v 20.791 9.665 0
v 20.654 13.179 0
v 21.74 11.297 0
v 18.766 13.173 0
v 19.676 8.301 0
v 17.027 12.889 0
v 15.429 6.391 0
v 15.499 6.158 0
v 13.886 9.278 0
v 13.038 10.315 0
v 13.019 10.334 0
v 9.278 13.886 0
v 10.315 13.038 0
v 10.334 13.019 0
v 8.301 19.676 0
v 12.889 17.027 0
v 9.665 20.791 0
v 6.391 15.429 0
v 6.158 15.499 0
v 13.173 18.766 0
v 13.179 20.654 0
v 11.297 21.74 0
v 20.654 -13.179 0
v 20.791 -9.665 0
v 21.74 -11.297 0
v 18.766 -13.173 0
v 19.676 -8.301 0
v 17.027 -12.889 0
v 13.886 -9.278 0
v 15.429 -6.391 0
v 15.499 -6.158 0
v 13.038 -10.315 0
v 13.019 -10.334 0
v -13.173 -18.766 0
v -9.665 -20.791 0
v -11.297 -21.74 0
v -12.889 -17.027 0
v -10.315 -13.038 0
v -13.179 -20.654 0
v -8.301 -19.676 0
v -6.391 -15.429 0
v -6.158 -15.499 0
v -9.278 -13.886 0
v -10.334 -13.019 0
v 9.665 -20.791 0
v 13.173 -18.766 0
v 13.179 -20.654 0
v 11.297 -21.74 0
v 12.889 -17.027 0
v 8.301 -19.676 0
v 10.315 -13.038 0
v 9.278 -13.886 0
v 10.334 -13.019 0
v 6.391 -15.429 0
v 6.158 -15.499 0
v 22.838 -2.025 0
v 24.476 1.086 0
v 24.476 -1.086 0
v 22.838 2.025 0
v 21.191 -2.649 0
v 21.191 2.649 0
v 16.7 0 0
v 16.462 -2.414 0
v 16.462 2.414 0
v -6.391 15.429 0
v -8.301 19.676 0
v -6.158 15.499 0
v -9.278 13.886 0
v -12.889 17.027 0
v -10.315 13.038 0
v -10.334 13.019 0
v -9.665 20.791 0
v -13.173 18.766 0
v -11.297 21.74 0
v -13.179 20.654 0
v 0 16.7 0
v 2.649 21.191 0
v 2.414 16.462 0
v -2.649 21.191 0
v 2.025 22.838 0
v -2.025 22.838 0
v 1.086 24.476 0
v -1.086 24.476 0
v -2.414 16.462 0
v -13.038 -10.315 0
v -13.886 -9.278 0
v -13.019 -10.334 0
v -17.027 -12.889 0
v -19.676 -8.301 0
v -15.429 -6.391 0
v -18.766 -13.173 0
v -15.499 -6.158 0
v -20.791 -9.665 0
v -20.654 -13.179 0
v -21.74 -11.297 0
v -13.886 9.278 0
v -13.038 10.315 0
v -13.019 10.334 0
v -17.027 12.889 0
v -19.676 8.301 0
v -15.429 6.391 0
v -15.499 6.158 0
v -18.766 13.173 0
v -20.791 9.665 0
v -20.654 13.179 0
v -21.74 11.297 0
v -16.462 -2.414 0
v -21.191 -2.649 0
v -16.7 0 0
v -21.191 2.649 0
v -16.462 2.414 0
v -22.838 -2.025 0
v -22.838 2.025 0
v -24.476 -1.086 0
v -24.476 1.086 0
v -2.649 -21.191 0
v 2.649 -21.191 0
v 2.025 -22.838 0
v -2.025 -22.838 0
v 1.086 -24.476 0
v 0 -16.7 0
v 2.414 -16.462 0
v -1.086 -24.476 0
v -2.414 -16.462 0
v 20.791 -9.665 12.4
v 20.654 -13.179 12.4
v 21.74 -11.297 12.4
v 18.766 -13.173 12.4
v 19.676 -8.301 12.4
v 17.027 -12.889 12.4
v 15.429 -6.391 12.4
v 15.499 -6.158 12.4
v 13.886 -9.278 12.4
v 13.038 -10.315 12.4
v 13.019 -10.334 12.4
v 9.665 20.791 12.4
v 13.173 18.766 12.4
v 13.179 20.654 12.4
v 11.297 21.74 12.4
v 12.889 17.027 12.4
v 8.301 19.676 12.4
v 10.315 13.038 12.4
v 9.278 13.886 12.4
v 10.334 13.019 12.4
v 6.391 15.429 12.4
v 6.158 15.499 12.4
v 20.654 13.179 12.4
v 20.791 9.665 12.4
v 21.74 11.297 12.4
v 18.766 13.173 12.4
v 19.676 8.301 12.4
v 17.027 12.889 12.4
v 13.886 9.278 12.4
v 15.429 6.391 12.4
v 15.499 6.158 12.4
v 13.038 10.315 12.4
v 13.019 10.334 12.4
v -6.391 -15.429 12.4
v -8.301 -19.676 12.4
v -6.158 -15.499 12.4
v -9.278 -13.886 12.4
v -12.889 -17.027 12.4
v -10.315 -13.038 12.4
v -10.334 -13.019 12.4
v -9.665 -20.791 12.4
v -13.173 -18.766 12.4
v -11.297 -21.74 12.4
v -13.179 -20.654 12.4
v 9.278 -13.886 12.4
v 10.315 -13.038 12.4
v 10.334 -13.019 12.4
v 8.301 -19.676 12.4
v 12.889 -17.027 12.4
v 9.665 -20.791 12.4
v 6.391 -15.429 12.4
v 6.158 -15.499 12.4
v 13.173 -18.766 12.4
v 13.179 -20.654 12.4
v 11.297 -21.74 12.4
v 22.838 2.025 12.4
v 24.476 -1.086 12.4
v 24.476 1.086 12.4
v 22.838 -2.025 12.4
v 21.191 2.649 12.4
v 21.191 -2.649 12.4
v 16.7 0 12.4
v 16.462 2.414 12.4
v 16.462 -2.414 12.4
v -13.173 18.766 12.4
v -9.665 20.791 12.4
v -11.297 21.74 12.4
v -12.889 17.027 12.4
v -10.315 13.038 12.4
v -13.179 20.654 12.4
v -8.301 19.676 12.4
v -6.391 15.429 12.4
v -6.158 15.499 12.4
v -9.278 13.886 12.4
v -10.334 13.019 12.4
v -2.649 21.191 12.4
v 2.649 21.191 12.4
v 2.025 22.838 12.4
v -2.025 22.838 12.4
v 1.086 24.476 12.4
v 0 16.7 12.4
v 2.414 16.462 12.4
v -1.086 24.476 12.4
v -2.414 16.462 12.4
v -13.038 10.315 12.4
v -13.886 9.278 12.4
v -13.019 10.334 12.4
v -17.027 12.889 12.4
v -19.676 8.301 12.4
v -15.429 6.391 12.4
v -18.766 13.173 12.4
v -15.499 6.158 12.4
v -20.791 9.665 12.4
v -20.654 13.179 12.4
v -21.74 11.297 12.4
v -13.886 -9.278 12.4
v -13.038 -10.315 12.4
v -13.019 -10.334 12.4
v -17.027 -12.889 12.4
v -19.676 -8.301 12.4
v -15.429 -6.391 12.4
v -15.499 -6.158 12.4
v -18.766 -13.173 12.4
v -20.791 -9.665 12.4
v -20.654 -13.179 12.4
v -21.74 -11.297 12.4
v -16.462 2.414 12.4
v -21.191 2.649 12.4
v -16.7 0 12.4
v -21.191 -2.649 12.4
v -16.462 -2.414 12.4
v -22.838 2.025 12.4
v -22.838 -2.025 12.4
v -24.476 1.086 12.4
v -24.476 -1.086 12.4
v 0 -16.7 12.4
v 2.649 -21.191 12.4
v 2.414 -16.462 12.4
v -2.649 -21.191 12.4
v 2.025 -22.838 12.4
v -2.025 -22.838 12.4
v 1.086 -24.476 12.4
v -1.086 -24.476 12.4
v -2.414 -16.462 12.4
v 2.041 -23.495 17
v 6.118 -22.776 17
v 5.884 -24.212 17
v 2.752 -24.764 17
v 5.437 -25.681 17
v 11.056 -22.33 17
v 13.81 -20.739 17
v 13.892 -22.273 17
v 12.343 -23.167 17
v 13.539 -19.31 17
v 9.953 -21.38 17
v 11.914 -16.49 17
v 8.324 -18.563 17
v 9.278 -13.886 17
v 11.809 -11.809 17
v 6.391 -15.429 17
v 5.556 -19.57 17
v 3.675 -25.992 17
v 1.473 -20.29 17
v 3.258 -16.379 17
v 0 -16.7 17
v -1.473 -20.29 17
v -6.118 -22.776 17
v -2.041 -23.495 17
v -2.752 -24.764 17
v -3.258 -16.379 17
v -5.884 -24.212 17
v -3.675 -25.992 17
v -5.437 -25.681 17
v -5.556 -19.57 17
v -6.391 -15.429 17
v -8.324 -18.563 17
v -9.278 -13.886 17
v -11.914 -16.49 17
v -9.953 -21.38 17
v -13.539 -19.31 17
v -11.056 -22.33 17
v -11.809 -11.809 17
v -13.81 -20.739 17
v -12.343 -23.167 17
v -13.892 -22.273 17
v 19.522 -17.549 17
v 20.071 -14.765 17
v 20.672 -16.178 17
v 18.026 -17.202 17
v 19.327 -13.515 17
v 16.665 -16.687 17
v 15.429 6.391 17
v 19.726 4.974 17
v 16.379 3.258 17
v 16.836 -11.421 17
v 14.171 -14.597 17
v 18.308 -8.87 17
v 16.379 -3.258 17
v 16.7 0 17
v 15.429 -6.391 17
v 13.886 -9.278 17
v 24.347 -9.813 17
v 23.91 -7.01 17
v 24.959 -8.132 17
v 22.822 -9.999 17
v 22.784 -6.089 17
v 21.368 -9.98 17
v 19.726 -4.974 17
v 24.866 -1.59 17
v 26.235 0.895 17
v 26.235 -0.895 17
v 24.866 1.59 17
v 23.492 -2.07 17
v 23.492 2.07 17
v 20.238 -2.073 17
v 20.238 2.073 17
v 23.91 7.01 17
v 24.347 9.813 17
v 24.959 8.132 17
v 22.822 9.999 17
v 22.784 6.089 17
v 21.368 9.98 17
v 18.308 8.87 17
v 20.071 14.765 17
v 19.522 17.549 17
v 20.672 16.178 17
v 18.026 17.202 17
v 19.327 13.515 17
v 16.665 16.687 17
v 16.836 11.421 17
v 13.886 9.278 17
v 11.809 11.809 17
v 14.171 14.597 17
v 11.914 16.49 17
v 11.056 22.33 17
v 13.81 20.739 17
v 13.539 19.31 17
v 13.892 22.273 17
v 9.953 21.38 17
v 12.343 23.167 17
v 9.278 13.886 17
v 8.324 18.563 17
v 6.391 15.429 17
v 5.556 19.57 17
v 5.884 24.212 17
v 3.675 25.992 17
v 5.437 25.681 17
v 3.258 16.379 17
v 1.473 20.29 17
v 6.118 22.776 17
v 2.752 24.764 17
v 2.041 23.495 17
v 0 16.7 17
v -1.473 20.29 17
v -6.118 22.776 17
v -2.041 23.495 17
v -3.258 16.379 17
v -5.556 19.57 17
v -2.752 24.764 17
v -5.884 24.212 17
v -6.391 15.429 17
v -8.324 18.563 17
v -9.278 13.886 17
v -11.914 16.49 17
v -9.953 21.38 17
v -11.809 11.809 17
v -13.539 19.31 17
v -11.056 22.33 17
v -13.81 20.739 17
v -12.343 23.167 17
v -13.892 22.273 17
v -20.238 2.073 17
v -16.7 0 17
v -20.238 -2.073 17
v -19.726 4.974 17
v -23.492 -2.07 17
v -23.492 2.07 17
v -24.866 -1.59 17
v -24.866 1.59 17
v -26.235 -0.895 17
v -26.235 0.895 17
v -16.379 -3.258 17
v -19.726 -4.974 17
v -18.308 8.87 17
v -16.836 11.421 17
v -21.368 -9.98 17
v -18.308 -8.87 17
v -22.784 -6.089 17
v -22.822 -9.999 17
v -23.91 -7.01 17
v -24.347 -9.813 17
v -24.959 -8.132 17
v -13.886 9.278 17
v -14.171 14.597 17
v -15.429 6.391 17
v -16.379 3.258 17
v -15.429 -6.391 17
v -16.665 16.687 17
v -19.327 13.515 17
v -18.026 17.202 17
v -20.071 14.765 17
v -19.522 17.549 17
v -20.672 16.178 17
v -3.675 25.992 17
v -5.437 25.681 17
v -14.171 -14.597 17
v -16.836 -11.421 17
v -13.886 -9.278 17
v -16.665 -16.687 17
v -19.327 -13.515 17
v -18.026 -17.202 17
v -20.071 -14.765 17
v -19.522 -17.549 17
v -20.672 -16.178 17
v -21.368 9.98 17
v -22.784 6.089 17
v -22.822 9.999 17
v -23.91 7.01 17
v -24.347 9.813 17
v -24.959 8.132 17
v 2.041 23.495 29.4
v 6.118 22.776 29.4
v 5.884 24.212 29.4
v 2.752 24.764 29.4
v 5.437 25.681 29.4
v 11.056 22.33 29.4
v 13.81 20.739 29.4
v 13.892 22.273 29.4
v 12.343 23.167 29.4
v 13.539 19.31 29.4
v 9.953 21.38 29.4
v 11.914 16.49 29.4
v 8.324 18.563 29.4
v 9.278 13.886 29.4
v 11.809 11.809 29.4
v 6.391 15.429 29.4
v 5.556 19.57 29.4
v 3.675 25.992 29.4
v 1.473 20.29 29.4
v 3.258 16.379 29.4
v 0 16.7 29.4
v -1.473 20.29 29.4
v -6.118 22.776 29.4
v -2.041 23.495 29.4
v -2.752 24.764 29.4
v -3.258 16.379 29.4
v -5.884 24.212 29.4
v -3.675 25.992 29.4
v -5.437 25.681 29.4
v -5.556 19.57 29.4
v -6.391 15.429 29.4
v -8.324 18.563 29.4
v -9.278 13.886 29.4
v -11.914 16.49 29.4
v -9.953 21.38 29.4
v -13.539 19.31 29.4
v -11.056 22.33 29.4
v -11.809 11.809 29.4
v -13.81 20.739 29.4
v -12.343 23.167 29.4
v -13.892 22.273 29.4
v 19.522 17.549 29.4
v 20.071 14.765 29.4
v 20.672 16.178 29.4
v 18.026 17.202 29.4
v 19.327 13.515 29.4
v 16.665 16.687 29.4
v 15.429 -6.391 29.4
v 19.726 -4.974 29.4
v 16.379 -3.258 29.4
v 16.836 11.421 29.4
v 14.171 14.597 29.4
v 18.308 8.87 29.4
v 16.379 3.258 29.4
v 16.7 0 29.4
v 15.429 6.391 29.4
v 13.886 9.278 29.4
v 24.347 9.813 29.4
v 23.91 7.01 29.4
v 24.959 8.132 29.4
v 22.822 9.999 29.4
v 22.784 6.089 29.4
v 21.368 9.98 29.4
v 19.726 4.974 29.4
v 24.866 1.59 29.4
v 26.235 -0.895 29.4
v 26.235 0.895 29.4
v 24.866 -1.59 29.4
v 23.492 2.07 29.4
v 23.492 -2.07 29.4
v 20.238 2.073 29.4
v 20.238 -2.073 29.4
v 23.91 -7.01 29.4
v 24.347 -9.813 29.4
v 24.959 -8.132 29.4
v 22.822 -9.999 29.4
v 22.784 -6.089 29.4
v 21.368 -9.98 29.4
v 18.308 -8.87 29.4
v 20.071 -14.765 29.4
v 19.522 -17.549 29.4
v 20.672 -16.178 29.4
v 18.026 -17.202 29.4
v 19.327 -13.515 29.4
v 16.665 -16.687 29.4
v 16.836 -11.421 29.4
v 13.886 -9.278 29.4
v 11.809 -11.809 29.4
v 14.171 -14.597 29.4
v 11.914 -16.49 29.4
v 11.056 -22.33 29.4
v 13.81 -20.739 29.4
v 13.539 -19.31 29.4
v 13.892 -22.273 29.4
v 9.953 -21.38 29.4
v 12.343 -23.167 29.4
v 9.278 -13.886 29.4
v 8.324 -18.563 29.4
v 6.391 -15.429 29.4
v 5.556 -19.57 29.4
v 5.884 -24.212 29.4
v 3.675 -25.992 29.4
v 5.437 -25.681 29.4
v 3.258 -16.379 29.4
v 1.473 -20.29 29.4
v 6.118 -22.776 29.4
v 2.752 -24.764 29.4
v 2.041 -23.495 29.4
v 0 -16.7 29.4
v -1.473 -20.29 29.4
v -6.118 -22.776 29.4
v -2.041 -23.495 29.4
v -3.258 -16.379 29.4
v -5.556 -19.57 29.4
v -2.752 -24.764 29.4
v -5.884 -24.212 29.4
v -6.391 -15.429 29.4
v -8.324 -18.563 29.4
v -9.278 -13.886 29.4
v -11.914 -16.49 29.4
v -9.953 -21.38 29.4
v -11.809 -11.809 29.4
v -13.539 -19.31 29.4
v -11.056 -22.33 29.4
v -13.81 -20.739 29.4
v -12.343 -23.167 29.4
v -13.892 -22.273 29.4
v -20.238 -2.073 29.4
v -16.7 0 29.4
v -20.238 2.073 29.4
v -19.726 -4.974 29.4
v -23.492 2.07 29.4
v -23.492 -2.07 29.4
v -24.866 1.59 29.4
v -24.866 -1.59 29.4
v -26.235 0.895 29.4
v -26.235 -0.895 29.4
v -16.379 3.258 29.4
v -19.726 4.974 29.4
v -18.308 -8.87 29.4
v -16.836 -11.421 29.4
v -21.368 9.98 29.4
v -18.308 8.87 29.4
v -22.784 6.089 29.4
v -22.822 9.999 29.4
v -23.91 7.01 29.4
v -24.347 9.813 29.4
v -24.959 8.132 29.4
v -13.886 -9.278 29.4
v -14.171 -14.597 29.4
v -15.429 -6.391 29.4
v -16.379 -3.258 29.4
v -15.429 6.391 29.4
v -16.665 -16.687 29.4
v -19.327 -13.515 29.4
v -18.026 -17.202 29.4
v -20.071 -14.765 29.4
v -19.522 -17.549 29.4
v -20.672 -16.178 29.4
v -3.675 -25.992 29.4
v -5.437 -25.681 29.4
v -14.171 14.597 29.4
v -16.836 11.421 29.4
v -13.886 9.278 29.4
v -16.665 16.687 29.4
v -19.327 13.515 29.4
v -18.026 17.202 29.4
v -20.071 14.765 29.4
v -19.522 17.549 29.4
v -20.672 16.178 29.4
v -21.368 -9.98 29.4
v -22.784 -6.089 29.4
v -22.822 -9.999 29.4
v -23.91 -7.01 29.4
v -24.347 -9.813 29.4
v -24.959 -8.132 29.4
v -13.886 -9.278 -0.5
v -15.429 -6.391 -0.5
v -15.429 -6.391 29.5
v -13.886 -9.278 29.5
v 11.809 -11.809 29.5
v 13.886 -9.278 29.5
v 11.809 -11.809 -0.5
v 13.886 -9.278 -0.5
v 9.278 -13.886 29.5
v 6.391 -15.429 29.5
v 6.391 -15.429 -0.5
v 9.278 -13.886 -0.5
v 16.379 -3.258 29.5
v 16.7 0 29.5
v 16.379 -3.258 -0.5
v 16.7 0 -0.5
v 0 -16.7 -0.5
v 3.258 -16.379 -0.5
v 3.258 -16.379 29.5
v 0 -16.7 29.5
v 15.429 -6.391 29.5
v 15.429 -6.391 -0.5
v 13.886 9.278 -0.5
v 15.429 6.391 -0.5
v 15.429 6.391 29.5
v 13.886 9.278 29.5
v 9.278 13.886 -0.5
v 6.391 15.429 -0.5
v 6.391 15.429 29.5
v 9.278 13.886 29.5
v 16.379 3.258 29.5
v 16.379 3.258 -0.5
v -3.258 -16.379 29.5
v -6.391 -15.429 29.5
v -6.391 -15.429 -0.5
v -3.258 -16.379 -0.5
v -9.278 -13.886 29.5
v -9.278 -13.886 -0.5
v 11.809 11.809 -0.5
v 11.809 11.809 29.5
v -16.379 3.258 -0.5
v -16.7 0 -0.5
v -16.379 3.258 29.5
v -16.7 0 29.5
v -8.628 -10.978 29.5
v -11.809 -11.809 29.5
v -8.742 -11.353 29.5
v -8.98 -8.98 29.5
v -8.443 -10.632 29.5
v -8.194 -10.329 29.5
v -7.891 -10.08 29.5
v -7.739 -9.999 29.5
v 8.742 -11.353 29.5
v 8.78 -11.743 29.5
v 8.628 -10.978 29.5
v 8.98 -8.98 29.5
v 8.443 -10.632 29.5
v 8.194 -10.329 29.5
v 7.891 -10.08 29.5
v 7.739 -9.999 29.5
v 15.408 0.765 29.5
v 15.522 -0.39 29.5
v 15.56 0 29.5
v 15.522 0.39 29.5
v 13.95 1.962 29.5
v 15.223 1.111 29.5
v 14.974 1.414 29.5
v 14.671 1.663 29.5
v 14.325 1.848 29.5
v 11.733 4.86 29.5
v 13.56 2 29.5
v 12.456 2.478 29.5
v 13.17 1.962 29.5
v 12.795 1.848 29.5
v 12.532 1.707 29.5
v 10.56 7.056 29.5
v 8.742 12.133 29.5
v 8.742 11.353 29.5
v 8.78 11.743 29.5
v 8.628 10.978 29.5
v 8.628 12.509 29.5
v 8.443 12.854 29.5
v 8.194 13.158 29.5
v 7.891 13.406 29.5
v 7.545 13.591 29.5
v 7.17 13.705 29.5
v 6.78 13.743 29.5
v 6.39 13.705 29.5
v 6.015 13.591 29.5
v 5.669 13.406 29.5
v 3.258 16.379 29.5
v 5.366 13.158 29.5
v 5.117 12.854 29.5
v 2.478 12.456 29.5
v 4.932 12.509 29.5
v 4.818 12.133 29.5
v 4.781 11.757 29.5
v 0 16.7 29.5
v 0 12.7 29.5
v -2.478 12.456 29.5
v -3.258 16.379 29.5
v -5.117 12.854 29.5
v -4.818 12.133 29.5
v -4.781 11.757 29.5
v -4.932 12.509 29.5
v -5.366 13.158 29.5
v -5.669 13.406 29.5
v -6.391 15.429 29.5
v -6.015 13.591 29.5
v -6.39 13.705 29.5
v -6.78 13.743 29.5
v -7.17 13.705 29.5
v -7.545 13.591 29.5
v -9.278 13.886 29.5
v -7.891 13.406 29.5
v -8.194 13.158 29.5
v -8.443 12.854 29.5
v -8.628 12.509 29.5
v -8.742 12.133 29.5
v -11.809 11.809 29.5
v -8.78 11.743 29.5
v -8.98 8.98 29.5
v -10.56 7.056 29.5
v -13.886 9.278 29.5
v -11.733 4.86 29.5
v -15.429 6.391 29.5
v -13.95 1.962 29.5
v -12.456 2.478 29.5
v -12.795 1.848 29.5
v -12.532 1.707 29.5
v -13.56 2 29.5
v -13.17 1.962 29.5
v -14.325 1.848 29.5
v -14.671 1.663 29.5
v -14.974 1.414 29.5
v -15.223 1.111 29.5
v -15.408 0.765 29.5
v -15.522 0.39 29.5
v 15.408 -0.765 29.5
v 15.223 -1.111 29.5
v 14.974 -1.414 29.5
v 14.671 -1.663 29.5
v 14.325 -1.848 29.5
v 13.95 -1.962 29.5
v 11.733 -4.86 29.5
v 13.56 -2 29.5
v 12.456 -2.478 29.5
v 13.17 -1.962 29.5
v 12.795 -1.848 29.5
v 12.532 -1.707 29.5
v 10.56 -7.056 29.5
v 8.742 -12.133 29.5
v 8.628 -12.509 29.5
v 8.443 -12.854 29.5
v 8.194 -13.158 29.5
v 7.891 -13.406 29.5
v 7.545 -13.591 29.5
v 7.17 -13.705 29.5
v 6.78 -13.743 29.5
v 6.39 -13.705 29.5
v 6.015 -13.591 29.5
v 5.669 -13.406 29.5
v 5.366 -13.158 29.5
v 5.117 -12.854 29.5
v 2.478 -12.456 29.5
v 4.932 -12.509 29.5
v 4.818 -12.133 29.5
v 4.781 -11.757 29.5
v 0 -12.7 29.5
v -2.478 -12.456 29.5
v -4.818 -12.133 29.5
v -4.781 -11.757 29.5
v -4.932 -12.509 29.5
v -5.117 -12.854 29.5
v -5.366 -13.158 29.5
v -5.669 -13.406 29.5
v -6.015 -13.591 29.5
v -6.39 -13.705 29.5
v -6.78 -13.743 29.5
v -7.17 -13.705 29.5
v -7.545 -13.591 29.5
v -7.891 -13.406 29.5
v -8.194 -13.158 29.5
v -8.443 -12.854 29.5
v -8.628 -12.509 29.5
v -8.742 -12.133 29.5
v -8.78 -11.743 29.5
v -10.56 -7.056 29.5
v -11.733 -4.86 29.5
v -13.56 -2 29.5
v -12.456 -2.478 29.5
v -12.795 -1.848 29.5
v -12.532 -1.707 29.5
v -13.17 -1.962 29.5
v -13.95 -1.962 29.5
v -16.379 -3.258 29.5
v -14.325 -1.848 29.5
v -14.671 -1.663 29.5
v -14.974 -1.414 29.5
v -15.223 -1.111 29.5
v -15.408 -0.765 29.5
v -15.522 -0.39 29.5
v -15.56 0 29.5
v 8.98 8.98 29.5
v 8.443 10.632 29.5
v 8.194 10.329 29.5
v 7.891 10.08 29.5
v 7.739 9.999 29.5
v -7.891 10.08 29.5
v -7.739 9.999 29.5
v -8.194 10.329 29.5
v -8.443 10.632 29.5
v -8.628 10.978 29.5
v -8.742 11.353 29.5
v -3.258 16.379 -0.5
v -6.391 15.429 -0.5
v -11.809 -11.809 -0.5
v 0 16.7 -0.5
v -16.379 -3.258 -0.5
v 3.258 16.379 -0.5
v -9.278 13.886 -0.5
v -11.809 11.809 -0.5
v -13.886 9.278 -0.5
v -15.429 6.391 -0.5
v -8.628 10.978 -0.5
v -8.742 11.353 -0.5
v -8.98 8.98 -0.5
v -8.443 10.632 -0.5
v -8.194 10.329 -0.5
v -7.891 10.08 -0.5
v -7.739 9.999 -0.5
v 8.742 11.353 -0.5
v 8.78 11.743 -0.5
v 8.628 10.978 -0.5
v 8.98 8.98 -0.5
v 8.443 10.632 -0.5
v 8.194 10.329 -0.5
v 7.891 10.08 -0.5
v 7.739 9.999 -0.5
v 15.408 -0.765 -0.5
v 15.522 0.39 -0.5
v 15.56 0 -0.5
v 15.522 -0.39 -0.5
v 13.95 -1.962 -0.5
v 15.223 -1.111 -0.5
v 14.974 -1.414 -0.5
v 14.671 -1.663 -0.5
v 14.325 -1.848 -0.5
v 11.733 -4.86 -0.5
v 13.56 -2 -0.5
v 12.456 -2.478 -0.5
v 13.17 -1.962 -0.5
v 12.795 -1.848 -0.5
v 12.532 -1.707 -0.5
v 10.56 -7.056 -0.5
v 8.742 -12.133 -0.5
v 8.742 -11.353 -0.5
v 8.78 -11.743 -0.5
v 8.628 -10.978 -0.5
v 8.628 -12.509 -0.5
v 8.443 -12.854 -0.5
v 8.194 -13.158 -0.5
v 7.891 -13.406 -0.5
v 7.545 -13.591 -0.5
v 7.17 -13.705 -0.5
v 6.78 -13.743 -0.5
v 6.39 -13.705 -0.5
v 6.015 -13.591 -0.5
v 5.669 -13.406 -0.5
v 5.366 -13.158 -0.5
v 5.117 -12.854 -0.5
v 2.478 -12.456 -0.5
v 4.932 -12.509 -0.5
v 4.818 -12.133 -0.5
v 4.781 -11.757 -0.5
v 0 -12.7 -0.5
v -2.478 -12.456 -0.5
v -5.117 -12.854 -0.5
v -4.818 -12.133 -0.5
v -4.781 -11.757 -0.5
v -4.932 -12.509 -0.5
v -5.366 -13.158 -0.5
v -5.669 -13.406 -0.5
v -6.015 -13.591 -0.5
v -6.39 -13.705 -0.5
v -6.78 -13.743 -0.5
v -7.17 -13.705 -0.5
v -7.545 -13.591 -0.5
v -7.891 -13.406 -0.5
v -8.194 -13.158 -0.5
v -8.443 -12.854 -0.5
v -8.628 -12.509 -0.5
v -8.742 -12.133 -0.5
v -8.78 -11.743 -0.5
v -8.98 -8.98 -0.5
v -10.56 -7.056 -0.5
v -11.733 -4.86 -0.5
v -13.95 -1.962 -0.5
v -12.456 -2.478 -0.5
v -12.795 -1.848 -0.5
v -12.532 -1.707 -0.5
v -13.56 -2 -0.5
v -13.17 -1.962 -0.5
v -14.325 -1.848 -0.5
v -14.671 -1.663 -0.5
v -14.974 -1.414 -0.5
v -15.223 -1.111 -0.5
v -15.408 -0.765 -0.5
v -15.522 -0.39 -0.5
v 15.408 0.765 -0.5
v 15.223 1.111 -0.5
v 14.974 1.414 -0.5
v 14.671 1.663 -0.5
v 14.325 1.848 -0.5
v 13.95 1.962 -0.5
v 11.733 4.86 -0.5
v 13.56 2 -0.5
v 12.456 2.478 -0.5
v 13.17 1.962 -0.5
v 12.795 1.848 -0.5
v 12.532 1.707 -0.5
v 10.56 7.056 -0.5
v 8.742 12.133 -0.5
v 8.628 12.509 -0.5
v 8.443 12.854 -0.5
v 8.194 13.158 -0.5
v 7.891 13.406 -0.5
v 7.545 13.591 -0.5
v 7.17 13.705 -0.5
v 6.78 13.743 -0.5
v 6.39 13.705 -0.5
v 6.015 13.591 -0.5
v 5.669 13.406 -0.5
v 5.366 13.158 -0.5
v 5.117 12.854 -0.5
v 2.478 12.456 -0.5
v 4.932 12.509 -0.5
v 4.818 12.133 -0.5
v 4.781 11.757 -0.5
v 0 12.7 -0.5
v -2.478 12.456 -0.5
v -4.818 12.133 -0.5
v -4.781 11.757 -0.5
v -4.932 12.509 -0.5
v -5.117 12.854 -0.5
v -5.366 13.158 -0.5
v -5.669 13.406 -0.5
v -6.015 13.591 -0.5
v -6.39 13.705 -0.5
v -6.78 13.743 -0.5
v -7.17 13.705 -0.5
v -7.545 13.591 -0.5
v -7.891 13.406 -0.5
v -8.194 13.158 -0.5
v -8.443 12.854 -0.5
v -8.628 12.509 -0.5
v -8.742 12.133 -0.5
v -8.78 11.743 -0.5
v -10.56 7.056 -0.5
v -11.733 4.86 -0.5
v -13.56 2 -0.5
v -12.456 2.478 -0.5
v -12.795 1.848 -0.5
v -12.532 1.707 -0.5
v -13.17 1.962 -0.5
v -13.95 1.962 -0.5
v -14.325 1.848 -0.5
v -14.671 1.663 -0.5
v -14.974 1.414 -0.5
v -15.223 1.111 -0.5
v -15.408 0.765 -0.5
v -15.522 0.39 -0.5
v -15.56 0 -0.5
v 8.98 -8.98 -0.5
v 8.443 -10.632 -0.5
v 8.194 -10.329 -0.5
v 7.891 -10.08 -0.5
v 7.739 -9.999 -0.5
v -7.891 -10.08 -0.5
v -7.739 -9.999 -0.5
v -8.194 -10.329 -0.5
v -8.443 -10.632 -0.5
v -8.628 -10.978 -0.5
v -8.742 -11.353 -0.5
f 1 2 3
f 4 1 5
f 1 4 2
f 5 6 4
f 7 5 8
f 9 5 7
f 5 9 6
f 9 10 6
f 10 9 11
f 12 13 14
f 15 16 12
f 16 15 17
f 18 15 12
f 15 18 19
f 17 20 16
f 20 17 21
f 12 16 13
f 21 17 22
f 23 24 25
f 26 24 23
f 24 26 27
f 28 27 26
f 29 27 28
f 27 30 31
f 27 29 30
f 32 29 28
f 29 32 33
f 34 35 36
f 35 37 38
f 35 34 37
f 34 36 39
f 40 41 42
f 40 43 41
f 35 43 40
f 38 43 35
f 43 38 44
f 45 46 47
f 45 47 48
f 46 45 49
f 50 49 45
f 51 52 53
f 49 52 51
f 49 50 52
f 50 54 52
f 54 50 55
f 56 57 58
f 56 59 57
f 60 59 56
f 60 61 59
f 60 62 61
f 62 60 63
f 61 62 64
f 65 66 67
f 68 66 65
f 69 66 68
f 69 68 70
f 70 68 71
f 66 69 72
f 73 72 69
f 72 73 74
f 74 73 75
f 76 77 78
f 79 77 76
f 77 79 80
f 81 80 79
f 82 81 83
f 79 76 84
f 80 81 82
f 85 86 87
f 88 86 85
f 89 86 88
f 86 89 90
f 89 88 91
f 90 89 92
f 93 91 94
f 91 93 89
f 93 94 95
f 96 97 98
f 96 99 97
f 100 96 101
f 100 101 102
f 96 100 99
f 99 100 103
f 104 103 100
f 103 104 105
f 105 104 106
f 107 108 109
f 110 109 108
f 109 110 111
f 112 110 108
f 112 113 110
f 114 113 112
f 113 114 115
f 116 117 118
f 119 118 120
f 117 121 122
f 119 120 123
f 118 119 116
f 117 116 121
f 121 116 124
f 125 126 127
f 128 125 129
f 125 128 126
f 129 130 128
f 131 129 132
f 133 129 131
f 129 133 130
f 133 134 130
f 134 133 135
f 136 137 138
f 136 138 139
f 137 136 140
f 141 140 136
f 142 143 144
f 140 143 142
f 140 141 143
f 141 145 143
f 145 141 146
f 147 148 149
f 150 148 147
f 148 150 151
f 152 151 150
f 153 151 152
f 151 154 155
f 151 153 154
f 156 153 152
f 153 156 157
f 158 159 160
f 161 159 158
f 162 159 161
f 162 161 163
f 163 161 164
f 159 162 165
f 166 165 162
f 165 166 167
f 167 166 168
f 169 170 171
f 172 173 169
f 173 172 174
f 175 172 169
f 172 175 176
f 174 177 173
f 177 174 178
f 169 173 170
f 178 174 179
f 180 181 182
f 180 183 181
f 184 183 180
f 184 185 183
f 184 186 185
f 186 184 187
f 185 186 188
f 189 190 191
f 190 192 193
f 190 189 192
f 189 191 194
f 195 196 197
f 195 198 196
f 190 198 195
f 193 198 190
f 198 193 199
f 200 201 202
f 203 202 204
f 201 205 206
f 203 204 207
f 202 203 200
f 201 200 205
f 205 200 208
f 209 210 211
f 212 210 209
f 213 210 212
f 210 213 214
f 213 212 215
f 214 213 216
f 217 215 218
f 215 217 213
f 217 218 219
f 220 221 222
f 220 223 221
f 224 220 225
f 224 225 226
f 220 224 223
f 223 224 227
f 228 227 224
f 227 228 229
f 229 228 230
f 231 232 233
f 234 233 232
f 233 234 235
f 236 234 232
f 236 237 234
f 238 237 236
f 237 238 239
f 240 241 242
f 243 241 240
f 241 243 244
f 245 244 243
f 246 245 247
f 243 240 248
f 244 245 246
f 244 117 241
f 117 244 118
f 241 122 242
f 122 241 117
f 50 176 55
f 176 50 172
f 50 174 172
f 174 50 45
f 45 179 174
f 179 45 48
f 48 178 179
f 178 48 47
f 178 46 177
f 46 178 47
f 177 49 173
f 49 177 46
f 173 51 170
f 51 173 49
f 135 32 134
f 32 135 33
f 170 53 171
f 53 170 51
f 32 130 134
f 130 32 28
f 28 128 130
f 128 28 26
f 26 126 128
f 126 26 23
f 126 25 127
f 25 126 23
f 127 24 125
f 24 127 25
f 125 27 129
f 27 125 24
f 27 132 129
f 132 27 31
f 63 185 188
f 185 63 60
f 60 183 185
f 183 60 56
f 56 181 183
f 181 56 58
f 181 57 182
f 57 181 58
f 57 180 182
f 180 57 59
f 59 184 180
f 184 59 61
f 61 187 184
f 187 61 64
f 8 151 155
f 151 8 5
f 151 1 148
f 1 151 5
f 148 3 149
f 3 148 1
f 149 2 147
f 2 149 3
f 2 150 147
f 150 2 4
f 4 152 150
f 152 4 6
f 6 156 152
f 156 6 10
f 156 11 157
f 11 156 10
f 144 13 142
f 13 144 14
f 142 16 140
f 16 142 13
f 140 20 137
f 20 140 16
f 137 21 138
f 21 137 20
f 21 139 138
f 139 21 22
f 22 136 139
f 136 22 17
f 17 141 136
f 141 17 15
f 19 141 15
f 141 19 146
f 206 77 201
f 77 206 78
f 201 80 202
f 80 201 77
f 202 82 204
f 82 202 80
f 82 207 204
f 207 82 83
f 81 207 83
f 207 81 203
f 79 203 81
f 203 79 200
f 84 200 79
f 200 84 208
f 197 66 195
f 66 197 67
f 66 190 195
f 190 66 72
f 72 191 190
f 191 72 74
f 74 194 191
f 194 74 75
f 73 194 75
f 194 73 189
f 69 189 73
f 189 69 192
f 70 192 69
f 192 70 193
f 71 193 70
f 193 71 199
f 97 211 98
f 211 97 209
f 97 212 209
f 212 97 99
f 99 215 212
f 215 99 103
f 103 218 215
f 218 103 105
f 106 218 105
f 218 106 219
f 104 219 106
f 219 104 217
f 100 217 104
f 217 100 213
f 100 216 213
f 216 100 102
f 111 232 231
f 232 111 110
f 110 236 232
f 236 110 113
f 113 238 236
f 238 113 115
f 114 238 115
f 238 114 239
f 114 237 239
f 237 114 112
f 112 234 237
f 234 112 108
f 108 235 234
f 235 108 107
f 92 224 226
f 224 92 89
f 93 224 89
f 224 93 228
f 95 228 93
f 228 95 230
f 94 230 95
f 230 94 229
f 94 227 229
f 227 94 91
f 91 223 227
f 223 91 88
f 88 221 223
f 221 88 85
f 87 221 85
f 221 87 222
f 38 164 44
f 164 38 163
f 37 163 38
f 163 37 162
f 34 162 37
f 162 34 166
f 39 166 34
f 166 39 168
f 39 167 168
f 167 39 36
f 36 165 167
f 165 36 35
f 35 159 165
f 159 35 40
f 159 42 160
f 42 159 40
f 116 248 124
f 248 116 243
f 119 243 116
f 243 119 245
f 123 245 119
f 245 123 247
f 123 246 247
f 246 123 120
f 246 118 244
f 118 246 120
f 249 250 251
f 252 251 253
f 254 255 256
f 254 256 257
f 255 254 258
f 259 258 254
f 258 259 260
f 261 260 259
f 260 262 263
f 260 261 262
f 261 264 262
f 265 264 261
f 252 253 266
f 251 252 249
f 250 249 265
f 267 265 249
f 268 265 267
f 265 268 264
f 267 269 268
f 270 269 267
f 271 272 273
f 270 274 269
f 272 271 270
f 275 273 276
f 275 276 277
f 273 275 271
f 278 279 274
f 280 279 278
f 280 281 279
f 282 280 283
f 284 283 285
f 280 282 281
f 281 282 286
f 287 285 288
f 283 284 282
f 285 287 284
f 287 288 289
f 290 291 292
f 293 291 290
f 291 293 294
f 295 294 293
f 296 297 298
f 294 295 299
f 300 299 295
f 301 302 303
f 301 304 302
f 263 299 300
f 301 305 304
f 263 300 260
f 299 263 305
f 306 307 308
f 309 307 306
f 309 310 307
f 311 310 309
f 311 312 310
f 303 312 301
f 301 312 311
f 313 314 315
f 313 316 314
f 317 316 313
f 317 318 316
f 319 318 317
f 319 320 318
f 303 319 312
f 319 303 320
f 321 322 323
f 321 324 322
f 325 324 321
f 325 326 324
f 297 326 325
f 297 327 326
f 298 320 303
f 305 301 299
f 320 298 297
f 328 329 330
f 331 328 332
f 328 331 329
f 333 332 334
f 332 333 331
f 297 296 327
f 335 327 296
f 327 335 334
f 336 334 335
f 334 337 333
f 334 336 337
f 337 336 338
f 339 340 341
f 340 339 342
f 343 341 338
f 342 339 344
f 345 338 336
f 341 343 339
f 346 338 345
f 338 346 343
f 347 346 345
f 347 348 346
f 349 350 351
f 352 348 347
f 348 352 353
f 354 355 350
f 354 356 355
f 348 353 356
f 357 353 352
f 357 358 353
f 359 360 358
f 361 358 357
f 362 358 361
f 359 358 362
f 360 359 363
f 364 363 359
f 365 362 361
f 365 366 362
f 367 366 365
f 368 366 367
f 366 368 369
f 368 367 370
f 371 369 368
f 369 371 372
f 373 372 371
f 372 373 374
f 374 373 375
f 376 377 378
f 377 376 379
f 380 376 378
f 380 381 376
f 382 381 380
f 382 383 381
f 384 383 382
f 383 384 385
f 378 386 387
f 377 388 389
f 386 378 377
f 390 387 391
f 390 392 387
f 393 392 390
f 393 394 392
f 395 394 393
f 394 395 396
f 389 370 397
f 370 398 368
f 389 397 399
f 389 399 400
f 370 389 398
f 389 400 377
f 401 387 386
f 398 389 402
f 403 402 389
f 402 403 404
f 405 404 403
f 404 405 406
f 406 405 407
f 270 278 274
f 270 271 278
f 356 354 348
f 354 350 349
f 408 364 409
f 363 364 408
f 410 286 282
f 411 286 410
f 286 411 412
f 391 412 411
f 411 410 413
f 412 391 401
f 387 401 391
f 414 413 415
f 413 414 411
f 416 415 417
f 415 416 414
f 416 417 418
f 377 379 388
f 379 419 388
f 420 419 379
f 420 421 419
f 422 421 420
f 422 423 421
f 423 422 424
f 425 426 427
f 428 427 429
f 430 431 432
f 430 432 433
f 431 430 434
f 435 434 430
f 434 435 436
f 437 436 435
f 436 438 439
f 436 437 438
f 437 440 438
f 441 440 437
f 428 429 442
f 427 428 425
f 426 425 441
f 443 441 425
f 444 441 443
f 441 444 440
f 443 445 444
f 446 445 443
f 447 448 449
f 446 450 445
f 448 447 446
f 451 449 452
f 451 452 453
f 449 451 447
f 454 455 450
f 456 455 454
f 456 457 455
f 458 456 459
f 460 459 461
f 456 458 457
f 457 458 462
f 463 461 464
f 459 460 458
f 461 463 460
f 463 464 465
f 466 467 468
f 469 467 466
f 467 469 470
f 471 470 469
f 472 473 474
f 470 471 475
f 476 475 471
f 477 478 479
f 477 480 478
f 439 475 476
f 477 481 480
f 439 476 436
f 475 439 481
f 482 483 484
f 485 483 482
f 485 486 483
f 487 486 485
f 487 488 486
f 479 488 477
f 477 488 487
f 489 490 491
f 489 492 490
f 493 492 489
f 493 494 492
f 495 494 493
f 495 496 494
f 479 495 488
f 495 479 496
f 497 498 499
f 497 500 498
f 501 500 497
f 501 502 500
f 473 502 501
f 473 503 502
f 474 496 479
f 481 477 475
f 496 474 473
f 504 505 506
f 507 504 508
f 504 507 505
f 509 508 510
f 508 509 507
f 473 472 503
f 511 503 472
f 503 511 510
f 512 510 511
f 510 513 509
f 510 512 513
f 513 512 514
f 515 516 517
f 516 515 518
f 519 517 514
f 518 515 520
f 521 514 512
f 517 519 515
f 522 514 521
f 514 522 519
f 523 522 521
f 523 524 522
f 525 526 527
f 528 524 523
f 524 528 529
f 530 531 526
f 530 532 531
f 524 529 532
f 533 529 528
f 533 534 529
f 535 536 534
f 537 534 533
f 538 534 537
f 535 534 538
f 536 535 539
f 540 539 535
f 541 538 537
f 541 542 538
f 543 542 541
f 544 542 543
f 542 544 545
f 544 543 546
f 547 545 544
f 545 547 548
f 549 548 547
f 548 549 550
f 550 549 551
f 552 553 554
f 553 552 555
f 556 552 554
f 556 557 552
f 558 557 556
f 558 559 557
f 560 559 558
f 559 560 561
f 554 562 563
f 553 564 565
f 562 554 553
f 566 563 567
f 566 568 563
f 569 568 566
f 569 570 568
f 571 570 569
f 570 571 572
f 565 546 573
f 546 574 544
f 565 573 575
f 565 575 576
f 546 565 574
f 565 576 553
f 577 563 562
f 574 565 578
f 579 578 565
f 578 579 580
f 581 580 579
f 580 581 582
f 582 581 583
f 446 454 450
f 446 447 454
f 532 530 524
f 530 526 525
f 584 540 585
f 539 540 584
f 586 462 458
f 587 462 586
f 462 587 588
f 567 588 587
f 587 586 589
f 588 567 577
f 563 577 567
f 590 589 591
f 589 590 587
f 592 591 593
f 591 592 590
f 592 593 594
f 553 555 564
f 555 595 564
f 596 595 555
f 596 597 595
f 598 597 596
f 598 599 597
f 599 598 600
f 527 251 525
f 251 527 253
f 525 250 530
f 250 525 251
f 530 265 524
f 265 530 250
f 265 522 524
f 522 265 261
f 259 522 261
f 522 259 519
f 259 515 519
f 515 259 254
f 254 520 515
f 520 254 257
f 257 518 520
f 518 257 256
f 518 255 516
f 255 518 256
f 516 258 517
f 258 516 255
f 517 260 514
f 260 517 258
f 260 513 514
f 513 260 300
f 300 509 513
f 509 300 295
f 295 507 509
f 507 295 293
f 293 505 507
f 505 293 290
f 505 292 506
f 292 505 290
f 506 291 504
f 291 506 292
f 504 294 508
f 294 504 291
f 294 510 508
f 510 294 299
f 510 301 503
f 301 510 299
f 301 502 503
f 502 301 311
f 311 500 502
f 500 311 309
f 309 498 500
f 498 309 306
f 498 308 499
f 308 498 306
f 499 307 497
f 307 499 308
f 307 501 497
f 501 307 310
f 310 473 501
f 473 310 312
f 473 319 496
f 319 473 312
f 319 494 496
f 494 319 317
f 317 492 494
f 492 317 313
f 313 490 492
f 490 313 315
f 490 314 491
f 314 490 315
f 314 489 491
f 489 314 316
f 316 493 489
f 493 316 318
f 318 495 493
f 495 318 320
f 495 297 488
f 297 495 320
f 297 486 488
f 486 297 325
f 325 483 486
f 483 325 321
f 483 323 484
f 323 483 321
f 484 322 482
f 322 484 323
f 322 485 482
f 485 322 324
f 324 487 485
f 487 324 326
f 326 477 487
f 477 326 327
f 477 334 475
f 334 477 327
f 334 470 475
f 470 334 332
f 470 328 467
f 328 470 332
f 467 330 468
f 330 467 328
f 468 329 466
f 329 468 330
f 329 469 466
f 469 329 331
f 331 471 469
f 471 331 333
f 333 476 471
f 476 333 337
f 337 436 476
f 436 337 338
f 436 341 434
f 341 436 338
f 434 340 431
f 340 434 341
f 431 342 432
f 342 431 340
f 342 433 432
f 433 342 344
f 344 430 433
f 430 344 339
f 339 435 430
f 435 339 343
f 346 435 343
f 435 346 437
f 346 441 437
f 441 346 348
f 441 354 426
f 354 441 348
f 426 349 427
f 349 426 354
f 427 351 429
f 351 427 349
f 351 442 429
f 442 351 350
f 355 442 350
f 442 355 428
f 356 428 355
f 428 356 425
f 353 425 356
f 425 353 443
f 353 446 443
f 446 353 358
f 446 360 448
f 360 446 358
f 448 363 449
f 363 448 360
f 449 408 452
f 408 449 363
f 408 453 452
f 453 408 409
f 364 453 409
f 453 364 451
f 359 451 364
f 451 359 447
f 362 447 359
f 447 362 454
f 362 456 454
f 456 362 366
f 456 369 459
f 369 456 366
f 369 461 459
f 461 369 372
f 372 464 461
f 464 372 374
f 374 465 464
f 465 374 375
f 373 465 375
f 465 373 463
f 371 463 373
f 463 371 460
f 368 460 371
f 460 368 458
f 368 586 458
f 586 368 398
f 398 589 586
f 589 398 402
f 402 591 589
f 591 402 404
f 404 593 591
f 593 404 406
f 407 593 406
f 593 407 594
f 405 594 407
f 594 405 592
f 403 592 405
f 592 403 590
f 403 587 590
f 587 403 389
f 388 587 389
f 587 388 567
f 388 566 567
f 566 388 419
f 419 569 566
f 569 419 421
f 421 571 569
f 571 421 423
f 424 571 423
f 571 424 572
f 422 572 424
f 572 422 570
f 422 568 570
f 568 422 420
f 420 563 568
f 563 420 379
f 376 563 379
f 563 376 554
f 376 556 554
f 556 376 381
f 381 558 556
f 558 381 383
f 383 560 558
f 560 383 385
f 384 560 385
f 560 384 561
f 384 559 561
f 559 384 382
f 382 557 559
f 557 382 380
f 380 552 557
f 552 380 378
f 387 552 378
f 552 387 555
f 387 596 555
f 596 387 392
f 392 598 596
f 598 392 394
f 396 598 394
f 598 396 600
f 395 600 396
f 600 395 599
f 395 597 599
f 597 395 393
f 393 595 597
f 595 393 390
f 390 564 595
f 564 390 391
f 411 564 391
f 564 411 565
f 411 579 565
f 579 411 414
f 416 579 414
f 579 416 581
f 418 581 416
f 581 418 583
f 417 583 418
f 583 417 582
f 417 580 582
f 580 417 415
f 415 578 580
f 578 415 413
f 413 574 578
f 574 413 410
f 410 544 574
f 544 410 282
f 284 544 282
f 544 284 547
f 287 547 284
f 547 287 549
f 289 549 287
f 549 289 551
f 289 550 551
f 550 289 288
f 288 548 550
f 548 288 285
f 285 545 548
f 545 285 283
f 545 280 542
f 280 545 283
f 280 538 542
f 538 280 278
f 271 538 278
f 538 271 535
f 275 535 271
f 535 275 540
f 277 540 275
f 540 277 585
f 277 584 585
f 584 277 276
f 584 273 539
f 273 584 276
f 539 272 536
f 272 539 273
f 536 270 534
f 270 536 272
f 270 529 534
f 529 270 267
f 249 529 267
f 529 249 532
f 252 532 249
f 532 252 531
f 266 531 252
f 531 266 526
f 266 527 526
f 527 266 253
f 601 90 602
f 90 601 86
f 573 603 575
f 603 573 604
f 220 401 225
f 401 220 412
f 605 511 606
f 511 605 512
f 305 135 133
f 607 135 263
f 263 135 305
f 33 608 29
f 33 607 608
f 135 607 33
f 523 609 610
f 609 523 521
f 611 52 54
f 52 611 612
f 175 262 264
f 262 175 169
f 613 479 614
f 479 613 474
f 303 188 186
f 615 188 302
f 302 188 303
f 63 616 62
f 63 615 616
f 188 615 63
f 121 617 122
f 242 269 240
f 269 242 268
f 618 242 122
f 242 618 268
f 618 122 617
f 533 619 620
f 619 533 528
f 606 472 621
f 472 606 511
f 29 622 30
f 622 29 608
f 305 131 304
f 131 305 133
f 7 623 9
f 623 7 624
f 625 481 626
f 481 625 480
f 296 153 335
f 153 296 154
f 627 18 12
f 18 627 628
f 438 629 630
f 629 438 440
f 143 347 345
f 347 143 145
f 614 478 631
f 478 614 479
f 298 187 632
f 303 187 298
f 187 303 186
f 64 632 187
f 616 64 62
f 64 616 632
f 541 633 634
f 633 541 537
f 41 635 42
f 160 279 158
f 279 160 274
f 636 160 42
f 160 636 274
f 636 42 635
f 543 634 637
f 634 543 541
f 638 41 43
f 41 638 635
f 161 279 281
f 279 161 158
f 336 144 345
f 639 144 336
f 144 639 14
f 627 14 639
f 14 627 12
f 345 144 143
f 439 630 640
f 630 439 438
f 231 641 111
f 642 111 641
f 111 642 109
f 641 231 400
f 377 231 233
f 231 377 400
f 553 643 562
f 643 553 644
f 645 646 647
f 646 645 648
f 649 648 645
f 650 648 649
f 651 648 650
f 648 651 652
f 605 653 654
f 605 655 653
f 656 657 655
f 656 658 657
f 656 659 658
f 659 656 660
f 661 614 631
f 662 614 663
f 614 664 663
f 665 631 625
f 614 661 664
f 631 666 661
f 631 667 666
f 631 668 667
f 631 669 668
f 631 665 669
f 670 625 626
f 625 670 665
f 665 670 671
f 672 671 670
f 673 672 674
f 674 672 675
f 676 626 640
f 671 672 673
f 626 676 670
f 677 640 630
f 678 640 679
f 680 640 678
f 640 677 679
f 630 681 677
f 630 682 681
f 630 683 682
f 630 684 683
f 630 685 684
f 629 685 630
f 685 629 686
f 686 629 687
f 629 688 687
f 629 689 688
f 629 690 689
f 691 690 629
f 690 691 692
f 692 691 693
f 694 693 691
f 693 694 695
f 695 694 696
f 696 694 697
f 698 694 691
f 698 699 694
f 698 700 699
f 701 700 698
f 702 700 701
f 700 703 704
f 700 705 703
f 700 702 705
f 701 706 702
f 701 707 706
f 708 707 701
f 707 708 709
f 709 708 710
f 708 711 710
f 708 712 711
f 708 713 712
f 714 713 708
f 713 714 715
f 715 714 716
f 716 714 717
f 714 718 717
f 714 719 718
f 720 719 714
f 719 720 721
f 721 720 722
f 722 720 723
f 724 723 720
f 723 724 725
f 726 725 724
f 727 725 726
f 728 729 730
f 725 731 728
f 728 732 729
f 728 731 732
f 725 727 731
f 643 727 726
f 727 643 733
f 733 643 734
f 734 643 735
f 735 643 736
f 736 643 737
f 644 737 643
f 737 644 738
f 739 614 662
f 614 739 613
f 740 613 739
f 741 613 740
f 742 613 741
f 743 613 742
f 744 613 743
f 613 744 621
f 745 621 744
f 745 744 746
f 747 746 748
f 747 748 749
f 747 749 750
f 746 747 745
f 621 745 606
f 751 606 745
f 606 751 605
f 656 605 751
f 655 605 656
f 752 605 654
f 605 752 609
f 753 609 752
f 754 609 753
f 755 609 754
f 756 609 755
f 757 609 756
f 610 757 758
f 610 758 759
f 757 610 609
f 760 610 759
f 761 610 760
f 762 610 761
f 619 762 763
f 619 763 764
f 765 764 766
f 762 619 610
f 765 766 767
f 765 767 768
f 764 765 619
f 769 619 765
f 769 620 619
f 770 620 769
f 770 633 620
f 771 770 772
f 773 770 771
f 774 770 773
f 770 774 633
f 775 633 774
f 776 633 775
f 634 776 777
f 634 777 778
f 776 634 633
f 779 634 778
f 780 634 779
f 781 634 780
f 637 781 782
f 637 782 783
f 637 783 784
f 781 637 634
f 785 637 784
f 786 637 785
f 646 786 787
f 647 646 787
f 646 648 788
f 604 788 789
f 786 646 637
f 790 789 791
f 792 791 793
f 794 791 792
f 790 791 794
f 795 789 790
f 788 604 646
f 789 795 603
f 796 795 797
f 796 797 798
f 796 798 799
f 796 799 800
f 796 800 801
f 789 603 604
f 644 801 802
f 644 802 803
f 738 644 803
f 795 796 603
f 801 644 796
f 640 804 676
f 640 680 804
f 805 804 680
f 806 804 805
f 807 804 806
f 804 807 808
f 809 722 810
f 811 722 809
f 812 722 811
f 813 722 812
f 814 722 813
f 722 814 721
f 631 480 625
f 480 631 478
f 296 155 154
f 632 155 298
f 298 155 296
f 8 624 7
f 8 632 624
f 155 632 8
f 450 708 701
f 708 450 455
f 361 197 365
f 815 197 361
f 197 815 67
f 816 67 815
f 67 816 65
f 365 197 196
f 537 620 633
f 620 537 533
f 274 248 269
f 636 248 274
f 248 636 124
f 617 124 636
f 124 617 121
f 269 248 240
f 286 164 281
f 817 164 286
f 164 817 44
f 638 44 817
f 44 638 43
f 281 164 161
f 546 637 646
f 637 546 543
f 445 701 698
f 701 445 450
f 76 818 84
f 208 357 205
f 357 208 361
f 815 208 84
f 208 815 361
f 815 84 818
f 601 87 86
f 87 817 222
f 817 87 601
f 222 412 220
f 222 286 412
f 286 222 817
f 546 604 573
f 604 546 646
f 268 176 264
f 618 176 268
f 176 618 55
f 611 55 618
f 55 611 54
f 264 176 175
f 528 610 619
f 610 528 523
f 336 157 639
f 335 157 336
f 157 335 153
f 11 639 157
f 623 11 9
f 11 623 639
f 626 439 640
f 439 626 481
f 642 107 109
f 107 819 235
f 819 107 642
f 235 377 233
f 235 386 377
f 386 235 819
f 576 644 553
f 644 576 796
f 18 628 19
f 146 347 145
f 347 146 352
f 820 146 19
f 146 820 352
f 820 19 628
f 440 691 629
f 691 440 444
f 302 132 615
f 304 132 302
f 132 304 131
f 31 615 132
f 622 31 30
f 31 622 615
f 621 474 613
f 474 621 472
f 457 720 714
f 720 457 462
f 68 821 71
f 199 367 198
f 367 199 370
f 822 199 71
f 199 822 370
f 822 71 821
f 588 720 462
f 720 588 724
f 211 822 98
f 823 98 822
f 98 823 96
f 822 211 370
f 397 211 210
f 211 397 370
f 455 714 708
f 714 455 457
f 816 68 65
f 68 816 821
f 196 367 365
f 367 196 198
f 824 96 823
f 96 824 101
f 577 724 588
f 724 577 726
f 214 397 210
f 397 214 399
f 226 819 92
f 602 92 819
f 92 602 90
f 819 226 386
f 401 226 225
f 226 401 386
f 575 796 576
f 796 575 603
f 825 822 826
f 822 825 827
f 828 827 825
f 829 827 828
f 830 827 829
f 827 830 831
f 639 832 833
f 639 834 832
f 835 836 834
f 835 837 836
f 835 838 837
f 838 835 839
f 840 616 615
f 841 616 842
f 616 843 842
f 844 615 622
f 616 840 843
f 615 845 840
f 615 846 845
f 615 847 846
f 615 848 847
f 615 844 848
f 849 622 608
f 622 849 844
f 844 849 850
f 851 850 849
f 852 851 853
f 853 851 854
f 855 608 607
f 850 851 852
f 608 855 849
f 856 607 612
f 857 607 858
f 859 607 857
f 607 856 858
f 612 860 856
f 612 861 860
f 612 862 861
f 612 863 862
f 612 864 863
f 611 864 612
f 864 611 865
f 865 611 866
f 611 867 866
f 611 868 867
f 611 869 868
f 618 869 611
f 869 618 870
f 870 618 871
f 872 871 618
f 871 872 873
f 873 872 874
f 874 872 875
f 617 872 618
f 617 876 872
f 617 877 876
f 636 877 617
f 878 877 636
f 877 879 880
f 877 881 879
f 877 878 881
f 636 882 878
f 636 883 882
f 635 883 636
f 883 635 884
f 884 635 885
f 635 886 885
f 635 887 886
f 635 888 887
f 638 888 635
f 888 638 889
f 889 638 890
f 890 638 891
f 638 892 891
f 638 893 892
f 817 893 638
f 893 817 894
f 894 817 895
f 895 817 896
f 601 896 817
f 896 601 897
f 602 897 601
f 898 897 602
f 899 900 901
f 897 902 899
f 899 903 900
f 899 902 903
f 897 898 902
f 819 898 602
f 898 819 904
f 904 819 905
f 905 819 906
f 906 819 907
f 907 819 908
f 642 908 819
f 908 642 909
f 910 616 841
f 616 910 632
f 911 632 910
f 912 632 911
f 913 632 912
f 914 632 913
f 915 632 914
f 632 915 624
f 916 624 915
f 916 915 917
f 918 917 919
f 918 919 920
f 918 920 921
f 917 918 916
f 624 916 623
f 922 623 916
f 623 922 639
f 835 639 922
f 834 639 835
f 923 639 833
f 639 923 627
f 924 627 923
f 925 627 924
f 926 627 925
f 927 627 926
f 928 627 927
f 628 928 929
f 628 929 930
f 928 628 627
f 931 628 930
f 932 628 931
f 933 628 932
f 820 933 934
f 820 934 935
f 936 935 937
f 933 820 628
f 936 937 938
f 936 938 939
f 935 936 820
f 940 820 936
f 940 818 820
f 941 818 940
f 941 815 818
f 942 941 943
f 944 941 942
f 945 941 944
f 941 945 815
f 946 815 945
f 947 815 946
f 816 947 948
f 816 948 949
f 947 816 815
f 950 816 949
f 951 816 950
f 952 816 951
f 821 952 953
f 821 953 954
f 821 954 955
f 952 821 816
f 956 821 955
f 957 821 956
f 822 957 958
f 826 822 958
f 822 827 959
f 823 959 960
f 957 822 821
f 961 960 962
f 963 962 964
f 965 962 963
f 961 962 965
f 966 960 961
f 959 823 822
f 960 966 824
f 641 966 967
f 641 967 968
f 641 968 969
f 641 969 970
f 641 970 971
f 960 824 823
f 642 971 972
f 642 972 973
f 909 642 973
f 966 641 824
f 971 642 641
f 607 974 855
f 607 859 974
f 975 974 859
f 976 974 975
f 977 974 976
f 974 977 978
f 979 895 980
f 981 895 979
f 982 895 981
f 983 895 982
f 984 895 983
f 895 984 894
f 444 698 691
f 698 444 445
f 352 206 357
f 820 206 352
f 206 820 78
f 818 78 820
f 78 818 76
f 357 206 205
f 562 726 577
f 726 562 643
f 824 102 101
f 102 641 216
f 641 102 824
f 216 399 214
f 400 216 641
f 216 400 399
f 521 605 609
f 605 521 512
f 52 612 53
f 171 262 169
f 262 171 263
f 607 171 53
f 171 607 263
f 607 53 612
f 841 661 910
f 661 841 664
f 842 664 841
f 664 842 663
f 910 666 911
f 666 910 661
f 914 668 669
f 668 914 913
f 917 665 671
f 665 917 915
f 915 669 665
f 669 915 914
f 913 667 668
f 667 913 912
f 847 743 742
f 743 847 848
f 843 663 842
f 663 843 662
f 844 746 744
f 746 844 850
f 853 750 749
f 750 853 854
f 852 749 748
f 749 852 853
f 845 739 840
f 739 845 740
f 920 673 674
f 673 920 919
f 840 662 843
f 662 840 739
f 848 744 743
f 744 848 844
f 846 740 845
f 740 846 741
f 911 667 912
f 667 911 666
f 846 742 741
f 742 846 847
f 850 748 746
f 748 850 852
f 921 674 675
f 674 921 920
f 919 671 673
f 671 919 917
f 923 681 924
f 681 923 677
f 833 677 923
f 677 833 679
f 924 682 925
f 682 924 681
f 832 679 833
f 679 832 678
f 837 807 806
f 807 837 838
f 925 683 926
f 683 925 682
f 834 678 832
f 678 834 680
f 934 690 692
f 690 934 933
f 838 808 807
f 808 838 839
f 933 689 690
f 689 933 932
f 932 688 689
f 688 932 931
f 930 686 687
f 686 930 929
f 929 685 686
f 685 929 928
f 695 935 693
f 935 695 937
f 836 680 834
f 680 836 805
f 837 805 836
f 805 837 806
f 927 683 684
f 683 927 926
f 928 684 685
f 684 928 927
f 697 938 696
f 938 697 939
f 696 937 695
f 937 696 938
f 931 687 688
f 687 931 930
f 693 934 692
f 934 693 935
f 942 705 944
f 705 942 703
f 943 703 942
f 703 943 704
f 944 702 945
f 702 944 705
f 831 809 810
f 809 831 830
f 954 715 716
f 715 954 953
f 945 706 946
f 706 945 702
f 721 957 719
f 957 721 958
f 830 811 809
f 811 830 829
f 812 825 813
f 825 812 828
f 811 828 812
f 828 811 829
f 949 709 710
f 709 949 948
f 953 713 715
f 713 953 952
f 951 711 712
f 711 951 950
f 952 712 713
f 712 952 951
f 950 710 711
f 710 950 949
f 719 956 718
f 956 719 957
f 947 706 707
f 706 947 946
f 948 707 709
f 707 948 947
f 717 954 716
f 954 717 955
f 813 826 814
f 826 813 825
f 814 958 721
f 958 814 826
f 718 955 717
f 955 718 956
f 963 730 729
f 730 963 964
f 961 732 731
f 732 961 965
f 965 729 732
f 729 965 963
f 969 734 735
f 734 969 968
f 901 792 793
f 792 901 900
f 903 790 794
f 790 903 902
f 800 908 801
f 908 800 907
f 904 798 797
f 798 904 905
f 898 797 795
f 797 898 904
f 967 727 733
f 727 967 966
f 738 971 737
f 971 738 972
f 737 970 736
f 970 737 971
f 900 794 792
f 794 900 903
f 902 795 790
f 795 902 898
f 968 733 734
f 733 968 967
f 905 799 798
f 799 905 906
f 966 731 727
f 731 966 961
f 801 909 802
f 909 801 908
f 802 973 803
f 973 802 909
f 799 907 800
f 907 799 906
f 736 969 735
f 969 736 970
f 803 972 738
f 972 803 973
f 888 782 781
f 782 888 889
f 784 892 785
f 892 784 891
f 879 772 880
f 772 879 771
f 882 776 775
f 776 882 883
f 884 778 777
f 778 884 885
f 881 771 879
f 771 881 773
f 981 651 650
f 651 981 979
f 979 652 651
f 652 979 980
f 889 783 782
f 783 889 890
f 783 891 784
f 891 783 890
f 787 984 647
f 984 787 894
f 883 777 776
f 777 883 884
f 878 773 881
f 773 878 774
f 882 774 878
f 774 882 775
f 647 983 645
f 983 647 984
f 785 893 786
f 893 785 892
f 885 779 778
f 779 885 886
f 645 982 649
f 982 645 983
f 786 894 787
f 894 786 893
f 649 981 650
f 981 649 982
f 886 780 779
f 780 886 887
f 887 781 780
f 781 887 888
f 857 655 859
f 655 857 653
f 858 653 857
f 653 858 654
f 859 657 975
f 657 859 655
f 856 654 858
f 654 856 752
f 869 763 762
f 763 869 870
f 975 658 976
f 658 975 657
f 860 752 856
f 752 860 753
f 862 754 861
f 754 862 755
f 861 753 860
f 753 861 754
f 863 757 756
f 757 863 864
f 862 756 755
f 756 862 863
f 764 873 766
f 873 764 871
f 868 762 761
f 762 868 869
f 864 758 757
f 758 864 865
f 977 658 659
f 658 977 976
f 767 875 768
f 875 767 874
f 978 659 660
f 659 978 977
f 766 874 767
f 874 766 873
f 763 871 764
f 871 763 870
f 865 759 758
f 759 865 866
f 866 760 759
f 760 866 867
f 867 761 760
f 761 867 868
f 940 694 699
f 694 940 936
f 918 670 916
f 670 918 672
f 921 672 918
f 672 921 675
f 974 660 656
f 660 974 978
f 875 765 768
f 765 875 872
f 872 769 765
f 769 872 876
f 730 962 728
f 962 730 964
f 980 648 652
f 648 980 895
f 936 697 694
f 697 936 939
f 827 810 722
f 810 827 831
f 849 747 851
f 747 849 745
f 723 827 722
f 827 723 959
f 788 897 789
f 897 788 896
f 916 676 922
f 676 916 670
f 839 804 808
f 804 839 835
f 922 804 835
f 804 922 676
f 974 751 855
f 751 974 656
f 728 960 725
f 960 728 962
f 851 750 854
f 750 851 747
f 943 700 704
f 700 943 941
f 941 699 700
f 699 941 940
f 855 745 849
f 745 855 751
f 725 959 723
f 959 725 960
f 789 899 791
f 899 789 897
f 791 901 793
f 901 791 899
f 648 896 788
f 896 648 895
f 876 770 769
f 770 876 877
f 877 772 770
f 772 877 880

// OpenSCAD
$fn = 32;

// ----------------------------------------------------------------------
// Two-module gear rim: z12 m3.5 and z18 m2.62, 29 mm wide
// ----------------------------------------------------------------------

// --- parameters (mm) ---
module_a = 3.5;           // first tooth module
teeth_a = 12;             // first band tooth count
module_b = 2.62;          // second tooth module
teeth_b = 18;             // second band tooth count
band_h = 12;              // height of one tooth band
web_t = 5;                // web thickness between the bands
total = 29;               // overall width over both bands
root_r = 16.62;           // root radius of the coarse band
hub_r = 16.7;             // hub radius
bore_d = 25.4;            // hub bore
hole_count = 6;           // lightening holes
hole_r = 13.56;           // lightening hole circle radius
hole_d = 4;               // lightening hole diameter

band_a = [[16.449, -2.413], [21.191, -2.649], [22.838, -2.025], [24.476, -1.086], [24.476, 1.086], [22.838, 2.025], [21.191, 2.649], [16.449, 2.413], [15.452, 6.134], [19.676, 8.301], [20.791, 9.665], [21.74, 11.297], [20.654, 13.179], [18.766, 13.173], [17.027, 12.889], [13.038, 10.315], [10.315, 13.038], [12.889, 17.027], [13.173, 18.766], [13.179, 20.654], [11.297, 21.74], [9.665, 20.791], [8.301, 19.676], [6.134, 15.452], [2.413, 16.449], [2.649, 21.191], [2.025, 22.838], [1.086, 24.476], [-1.086, 24.476], [-2.025, 22.838], [-2.649, 21.191], [-2.413, 16.449], [-6.134, 15.452], [-8.301, 19.676], [-9.665, 20.791], [-11.297, 21.74], [-13.179, 20.654], [-13.173, 18.766], [-12.889, 17.027], [-10.315, 13.038], [-13.038, 10.315], [-17.027, 12.889], [-18.766, 13.173], [-20.654, 13.179], [-21.74, 11.297], [-20.791, 9.665], [-19.676, 8.301], [-15.452, 6.134], [-16.449, 2.413], [-21.191, 2.649], [-22.838, 2.025], [-24.476, 1.086], [-24.476, -1.086], [-22.838, -2.025], [-21.191, -2.649], [-16.449, -2.413], [-15.452, -6.134], [-19.676, -8.301], [-20.791, -9.665], [-21.74, -11.297], [-20.654, -13.179], [-18.766, -13.173], [-17.027, -12.889], [-13.038, -10.315], [-10.315, -13.038], [-12.889, -17.027], [-13.173, -18.766], [-13.179, -20.654], [-11.297, -21.74], [-9.665, -20.791], [-8.301, -19.676], [-6.134, -15.452], [-2.413, -16.449], [-2.649, -21.191], [-2.025, -22.838], [-1.086, -24.476], [1.086, -24.476], [2.025, -22.838], [2.649, -21.191], [2.413, -16.449], [6.134, -15.452], [8.301, -19.676], [9.665, -20.791], [11.297, -21.74], [13.179, -20.654], [13.173, -18.766], [12.889, -17.027], [10.315, -13.038], [13.038, -10.315], [17.027, -12.889], [18.766, -13.173], [20.654, -13.179], [21.74, -11.297], [20.791, -9.665], [19.676, -8.301], [15.452, -6.134]];
band_b = [[20.238, -2.073], [23.492, -2.07], [24.866, -1.59], [26.235, -0.895], [26.235, 0.895], [24.866, 1.59], [23.492, 2.07], [20.238, 2.073], [19.726, 4.974], [22.784, 6.089], [23.91, 7.01], [24.959, 8.132], [24.347, 9.813], [22.822, 9.999], [21.368, 9.98], [18.308, 8.87], [16.836, 11.421], [19.327, 13.515], [20.071, 14.765], [20.672, 16.178], [19.522, 17.549], [18.026, 17.202], [16.665, 16.687], [14.171, 14.597], [11.914, 16.49], [13.539, 19.31], [13.81, 20.739], [13.892, 22.273], [12.343, 23.167], [11.056, 22.33], [9.953, 21.38], [8.324, 18.563], [5.556, 19.57], [6.118, 22.776], [5.884, 24.212], [5.437, 25.681], [3.675, 25.992], [2.752, 24.764], [2.041, 23.495], [1.473, 20.29], [-1.473, 20.29], [-2.041, 23.495], [-2.752, 24.764], [-3.675, 25.992], [-5.437, 25.681], [-5.884, 24.212], [-6.118, 22.776], [-5.556, 19.57], [-8.324, 18.563], [-9.953, 21.38], [-11.056, 22.33], [-12.343, 23.167], [-13.892, 22.273], [-13.81, 20.739], [-13.539, 19.31], [-11.914, 16.49], [-14.171, 14.597], [-16.665, 16.687], [-18.026, 17.202], [-19.522, 17.549], [-20.672, 16.178], [-20.071, 14.765], [-19.327, 13.515], [-16.836, 11.421], [-18.308, 8.87], [-21.368, 9.98], [-22.822, 9.999], [-24.347, 9.813], [-24.959, 8.132], [-23.91, 7.01], [-22.784, 6.089], [-19.726, 4.974], [-20.238, 2.073], [-23.492, 2.07], [-24.866, 1.59], [-26.235, 0.895], [-26.235, -0.895], [-24.866, -1.59], [-23.492, -2.07], [-20.238, -2.073], [-19.726, -4.974], [-22.784, -6.089], [-23.91, -7.01], [-24.959, -8.132], [-24.347, -9.813], [-22.822, -9.999], [-21.368, -9.98], [-18.308, -8.87], [-16.836, -11.421], [-19.327, -13.515], [-20.071, -14.765], [-20.672, -16.178], [-19.522, -17.549], [-18.026, -17.202], [-16.665, -16.687], [-14.171, -14.597], [-11.914, -16.49], [-13.539, -19.31], [-13.81, -20.739], [-13.892, -22.273], [-12.343, -23.167], [-11.056, -22.33], [-9.953, -21.38], [-8.324, -18.563], [-5.556, -19.57], [-6.118, -22.776], [-5.884, -24.212], [-5.437, -25.681], [-3.675, -25.992], [-2.752, -24.764], [-2.041, -23.495], [-1.473, -20.29], [1.473, -20.29], [2.041, -23.495], [2.752, -24.764], [3.675, -25.992], [5.437, -25.681], [5.884, -24.212], [6.118, -22.776], [5.556, -19.57], [8.324, -18.563], [9.953, -21.38], [11.056, -22.33], [12.343, -23.167], [13.892, -22.273], [13.81, -20.739], [13.539, -19.31], [11.914, -16.49], [14.171, -14.597], [16.665, -16.687], [18.026, -17.202], [19.522, -17.549], [20.672, -16.178], [20.071, -14.765], [19.327, -13.515], [16.836, -11.421], [18.308, -8.87], [21.368, -9.98], [22.822, -9.999], [24.347, -9.813], [24.959, -8.132], [23.91, -7.01], [22.784, -6.089], [19.726, -4.974]];

difference() {
  union() {
    /* tooth band A, overlapping the web by 0.4 mm */
    linear_extrude(height = band_h + 0.4) polygon(band_a);
    /* web */
    translate([0, 0, band_h - 0.4]) cylinder(h = web_t + 0.8, d = 2 * root_r);
    /* tooth band B */
    translate([0, 0, band_h + web_t]) linear_extrude(height = band_h + 0.4) polygon(band_b);
    /* hub */
    translate([0, 0, -0.5]) cylinder(h = total + 1.0, d = 2 * hub_r);
  }
  /* bore */
  translate([0, 0, -2.5]) cylinder(h = total + 5, d = bore_d);
  /* lightening holes through the web */
  for (i = [0 : hole_count - 1]) {
    a = i * 360 / hole_count;
    translate([hole_r * cos(a), hole_r * sin(a), -2.5]) cylinder(h = total + 5, d = hole_d);
  }
}
